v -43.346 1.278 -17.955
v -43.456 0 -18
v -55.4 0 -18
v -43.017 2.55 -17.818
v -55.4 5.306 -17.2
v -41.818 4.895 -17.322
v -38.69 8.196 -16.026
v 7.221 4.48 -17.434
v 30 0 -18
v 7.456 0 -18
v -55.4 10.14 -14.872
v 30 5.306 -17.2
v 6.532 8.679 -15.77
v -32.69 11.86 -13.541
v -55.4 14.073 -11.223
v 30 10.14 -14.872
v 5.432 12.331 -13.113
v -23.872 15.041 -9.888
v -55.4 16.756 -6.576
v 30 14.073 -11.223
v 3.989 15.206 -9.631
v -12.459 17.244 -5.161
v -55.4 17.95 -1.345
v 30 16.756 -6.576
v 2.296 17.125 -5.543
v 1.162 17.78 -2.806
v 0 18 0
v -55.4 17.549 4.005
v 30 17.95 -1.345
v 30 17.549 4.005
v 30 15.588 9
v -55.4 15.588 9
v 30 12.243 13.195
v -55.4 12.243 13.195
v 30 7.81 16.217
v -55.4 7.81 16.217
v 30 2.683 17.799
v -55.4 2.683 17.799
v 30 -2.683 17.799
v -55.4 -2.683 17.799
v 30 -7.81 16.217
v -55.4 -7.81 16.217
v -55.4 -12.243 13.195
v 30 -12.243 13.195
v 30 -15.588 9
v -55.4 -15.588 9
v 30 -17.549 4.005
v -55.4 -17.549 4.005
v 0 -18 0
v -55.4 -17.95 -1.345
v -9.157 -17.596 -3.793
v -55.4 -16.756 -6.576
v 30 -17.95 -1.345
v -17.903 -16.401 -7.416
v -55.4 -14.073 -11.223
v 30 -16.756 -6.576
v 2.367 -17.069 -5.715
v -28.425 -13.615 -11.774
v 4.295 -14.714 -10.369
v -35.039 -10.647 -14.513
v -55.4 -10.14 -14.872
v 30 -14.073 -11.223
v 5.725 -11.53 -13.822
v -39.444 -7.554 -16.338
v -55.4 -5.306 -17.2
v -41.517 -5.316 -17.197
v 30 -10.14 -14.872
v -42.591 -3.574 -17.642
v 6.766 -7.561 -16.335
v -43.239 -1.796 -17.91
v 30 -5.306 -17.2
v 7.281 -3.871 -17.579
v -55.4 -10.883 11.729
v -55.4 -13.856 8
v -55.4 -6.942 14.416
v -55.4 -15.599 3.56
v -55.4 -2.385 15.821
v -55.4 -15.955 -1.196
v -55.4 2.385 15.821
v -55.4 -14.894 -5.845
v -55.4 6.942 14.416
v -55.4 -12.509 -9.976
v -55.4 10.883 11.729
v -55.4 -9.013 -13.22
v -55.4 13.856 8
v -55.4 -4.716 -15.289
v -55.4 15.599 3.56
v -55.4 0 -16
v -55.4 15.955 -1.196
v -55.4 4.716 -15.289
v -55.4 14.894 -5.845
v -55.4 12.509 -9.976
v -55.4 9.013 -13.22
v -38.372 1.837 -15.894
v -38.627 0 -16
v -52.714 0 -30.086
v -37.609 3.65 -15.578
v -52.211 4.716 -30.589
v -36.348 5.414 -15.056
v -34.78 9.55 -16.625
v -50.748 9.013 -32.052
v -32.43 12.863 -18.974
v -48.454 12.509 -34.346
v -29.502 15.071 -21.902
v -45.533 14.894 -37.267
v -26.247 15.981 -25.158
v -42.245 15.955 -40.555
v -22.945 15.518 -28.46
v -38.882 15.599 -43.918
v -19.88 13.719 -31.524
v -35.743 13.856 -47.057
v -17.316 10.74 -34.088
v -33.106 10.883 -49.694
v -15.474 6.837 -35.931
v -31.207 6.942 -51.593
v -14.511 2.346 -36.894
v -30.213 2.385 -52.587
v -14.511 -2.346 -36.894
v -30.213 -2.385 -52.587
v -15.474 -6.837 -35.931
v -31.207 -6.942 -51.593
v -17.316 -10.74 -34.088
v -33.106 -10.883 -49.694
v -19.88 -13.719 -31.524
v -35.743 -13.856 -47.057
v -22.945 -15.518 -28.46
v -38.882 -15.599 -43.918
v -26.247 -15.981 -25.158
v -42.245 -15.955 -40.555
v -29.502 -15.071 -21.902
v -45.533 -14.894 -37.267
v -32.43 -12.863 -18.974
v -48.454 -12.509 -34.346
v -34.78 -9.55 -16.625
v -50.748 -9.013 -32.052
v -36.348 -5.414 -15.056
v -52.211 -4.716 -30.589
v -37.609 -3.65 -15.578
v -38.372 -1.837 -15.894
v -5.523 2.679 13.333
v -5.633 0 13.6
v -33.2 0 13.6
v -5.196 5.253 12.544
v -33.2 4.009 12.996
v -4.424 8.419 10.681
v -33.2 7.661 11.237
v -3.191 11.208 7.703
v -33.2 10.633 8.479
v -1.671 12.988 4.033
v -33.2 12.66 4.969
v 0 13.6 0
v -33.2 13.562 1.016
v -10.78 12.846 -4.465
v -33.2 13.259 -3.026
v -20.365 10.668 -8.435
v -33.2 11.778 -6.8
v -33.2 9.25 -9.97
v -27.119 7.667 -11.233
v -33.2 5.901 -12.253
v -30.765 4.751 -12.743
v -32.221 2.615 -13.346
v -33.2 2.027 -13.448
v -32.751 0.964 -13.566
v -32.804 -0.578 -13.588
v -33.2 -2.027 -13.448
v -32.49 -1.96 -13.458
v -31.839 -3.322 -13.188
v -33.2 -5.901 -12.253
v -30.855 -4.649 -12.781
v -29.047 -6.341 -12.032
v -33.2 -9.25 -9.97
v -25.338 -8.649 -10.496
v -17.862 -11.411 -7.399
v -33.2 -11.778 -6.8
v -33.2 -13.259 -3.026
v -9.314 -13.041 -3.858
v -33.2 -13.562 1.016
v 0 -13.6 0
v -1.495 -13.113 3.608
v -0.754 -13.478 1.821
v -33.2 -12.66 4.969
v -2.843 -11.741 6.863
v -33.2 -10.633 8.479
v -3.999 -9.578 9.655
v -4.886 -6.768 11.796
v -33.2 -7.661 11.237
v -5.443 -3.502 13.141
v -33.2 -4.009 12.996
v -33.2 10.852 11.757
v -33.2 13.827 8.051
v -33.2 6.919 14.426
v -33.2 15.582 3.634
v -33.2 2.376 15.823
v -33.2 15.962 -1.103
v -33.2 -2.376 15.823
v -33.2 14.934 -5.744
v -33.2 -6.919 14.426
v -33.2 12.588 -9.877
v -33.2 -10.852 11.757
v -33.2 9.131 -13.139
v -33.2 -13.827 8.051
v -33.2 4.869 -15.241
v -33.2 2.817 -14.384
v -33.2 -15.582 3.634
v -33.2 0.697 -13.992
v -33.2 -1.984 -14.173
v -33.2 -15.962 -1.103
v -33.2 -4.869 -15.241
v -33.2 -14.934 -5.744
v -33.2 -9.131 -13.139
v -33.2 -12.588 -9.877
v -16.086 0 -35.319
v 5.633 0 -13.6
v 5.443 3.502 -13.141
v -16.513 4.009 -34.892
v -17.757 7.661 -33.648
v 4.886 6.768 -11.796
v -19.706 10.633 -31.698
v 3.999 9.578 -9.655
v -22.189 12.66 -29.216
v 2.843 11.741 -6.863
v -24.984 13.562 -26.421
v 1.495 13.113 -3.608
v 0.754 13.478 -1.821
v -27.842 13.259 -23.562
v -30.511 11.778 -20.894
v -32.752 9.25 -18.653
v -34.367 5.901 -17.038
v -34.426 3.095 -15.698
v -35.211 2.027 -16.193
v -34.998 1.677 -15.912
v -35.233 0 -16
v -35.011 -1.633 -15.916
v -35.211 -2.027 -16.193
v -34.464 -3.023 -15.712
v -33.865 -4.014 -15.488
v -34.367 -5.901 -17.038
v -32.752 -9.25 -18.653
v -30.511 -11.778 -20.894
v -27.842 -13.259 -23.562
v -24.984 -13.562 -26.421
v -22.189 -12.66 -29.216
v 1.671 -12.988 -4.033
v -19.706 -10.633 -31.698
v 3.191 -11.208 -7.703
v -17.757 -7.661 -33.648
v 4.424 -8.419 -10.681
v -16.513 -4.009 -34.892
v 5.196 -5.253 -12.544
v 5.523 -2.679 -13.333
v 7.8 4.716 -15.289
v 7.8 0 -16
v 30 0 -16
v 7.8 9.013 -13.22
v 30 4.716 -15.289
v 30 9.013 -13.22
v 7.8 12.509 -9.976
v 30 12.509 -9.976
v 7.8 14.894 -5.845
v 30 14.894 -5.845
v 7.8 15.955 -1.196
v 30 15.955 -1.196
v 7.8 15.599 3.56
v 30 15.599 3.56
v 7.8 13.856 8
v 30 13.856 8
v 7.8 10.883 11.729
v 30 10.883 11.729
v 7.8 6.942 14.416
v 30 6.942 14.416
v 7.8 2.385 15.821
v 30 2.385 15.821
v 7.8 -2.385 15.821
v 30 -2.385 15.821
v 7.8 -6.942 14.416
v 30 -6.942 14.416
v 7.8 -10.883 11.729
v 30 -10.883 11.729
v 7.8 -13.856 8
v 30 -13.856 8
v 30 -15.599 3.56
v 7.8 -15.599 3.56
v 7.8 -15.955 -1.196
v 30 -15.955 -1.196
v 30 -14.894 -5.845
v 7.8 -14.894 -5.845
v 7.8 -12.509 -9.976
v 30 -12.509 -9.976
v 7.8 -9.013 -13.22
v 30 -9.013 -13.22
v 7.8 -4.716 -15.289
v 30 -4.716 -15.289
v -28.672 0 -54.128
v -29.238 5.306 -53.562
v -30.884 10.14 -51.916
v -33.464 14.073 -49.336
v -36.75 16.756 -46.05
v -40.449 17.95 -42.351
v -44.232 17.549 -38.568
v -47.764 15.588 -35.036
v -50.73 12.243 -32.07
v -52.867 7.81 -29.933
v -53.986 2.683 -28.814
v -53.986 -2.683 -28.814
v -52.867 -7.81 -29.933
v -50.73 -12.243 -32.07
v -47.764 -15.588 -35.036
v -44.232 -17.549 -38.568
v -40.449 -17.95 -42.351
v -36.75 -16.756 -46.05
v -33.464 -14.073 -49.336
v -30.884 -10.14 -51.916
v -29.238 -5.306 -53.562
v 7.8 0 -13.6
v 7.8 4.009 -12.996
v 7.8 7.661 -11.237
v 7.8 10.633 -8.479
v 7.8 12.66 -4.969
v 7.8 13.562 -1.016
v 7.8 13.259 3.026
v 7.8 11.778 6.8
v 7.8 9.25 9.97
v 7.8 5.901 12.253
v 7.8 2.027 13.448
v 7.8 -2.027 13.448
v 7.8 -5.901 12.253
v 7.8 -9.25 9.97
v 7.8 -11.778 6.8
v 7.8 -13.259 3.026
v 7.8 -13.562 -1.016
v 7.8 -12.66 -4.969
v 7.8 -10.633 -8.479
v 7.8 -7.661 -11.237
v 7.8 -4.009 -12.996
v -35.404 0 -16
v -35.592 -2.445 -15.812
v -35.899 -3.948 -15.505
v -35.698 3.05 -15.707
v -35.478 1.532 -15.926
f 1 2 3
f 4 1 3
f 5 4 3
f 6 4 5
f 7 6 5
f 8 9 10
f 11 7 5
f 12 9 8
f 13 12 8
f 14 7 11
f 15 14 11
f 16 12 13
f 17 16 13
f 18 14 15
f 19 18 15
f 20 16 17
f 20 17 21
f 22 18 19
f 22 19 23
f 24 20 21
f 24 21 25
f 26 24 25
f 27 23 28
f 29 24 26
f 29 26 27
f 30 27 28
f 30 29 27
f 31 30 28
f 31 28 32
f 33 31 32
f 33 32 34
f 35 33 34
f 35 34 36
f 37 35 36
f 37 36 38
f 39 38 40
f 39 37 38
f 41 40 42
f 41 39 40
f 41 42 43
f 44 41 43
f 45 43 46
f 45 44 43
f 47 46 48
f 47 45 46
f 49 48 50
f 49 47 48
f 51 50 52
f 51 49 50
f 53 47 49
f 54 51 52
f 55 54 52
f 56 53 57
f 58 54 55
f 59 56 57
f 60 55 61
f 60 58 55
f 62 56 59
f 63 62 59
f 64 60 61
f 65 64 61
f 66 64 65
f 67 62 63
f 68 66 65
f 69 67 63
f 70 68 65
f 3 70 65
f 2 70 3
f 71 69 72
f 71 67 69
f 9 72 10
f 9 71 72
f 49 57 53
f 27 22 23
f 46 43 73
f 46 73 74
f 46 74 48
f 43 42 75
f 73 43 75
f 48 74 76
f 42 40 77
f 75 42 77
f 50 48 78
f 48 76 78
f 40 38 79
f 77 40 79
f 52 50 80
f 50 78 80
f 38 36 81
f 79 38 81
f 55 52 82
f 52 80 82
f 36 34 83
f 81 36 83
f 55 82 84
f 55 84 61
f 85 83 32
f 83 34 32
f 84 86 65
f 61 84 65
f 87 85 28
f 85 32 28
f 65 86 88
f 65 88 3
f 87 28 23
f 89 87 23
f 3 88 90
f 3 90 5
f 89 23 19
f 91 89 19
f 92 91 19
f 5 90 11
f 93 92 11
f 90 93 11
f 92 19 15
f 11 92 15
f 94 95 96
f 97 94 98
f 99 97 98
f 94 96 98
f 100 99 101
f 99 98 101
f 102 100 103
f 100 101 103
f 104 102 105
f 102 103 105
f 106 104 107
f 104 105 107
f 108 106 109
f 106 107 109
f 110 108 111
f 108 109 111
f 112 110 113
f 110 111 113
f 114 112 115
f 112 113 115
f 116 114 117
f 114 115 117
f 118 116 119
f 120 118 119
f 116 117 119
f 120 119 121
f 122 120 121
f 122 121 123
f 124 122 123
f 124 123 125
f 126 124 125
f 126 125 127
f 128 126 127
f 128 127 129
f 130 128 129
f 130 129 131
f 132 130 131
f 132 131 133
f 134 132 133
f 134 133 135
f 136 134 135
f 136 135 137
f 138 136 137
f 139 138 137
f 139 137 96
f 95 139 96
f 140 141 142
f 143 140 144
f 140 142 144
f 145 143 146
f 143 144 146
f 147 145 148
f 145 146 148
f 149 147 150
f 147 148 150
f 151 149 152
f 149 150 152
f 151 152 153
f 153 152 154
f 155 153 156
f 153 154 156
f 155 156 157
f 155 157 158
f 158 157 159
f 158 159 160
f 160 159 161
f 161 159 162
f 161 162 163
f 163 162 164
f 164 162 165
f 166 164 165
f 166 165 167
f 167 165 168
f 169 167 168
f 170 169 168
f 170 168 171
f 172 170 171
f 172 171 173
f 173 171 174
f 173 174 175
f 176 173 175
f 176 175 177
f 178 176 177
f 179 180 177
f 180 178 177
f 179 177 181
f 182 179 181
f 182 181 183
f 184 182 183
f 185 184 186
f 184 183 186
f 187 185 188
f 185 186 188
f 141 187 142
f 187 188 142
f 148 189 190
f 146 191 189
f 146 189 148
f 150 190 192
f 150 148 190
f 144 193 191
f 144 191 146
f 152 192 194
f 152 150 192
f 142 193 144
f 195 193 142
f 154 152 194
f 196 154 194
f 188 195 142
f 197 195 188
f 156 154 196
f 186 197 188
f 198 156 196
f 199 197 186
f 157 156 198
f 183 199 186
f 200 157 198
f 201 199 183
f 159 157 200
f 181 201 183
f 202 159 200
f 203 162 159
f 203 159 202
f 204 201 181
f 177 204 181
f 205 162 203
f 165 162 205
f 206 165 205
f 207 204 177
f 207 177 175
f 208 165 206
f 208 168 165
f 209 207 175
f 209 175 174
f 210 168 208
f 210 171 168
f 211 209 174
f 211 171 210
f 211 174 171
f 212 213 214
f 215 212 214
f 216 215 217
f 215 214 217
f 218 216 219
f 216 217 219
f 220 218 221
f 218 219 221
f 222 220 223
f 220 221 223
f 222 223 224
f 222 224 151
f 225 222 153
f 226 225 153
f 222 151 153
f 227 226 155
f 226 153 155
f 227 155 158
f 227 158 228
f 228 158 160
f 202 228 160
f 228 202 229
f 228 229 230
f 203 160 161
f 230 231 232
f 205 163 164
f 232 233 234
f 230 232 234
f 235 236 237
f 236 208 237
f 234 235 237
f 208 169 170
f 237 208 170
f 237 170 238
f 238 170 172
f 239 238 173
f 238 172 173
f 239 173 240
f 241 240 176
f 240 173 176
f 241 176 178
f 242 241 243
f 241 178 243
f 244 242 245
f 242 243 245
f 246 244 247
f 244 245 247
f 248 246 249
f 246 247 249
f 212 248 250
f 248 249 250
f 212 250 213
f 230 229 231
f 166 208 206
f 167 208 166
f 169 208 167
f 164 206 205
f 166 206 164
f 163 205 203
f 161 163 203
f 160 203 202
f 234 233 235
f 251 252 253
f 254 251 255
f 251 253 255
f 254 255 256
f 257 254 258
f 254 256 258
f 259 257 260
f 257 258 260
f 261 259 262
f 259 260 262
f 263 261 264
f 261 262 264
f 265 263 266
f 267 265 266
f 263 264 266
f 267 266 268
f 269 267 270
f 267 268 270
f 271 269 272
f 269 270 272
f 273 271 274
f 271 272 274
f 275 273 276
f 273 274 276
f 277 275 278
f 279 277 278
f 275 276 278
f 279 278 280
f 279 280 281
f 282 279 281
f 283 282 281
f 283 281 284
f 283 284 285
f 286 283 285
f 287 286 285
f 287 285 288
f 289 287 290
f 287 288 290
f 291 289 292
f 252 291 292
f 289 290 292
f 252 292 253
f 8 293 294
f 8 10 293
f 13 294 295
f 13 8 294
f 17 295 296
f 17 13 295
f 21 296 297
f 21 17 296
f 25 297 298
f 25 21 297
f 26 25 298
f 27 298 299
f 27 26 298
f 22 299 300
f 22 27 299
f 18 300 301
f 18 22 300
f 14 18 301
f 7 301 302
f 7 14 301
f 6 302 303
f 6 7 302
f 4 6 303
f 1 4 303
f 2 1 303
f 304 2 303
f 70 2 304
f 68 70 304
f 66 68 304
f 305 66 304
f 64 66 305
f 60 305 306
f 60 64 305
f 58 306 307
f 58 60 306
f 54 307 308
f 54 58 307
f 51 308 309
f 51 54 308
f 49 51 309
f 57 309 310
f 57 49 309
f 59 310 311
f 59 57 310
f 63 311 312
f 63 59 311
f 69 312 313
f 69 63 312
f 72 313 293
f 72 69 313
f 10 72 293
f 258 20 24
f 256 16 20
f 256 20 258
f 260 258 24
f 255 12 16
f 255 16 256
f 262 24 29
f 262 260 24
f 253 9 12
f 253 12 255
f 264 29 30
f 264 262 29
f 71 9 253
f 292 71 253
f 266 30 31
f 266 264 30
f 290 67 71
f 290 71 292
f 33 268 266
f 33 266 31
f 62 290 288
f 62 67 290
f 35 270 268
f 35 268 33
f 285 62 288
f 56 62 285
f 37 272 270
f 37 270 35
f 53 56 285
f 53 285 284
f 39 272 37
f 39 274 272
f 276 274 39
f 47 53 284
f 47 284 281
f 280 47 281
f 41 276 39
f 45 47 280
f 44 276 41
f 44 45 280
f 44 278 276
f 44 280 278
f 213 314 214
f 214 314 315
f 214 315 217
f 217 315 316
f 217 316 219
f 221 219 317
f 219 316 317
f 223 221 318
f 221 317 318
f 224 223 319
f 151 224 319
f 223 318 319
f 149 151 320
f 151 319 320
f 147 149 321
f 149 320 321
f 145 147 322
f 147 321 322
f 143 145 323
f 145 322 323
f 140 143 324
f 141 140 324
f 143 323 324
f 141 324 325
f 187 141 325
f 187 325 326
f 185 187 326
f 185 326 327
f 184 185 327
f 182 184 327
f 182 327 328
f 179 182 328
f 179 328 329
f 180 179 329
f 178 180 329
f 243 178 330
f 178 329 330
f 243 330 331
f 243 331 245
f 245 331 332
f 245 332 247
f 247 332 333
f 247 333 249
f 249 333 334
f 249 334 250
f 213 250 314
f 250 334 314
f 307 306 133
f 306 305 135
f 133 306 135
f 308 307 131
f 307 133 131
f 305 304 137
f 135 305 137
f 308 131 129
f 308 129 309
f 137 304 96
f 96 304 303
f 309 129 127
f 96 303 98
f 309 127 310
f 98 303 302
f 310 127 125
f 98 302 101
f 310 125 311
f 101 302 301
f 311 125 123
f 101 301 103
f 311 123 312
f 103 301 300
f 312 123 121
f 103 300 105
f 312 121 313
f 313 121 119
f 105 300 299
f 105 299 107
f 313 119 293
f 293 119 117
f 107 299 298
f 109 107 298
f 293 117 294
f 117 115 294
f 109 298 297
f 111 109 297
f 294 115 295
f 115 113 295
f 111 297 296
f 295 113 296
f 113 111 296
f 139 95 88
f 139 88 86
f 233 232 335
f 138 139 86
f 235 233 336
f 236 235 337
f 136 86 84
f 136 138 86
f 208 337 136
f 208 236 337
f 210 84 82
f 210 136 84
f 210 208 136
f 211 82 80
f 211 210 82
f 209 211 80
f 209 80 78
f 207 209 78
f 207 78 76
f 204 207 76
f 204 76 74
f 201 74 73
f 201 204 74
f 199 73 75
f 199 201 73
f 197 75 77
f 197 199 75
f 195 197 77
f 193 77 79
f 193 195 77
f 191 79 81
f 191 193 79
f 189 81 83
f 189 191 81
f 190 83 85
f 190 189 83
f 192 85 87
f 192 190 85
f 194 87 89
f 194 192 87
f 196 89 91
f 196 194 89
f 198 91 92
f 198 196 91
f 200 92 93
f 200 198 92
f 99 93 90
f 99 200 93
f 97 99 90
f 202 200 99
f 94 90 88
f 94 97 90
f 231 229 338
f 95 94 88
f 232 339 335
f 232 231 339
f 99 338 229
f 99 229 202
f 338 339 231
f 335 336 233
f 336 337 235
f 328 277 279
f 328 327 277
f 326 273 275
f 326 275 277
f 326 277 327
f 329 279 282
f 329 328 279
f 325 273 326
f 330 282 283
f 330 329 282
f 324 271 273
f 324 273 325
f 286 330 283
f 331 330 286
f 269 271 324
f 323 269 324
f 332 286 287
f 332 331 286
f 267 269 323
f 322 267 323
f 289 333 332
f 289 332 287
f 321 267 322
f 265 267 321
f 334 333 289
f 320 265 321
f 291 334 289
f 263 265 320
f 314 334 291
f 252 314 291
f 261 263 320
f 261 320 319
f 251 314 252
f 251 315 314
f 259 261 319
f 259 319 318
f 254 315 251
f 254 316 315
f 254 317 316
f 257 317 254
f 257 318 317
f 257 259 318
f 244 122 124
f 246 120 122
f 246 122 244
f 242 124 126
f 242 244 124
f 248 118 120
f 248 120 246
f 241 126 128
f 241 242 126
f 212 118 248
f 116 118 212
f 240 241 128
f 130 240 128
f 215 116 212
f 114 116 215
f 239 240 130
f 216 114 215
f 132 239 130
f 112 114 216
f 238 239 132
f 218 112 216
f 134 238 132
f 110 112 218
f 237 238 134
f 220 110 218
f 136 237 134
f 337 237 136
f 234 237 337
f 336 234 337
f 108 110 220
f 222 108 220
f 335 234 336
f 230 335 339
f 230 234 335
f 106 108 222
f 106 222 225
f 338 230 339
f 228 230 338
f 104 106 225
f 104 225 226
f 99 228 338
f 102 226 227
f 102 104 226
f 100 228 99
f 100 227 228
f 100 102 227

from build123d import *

# Parameters (mm, degrees)
SWEEP_1_PROFILE_R   = 18
SKETCH_35_R         = 18
EXTRUDE_1_DEPTH     = 85.4
SWEEP_1_2_PROFILE_R = 13.6
SKETCH_56_R         = 13.6
CUT_EXTRUDE_3_DEPTH = 103.698548903
SKETCH_33_R         = 16
CUT_EXTRUDE_1_DEPTH = 22.2
SKETCH_34_R         = 16
CUT_EXTRUDE_2_DEPTH = 22.2
CUT_EXTRUDE_START   = -22.2
SKETCH_56_4_R       = 16
CUT_EXTRUDE_4_DEPTH = 22.2


with BuildPart() as part:
    # Sweep 1: sweep along a path in 草图1
    with BuildLine(Plane(origin=(0, 0, 0), x_dir=(1, 0, 0), z_dir=(0, 1, 0))) as sweep_1_path:
        Line((-41.4, 41.4), (0, 0))
        Line((0, 0), (30, 0))
    # Sweep 1 profile (on start of the path) → Sweep 1 (sweep)
    with BuildSketch(Plane(origin=(-41.4, 0, -41.4), x_dir=(0.7071067811865488, 0, -0.7071067811865462), z_dir=(0.7071067811865462, 0, 0.7071067811865488))):
        Circle(SWEEP_1_PROFILE_R)
    sweep(path=sweep_1_path.line, transition=Transition.RIGHT)

    # 草图35 → 凸台-拉伸1 (add)
    with BuildSketch(Plane(origin=(30, 0, 0), x_dir=(0, 0, -1), z_dir=(1, 0, 0))):
        Circle(SKETCH_35_R)
    extrude(amount=-EXTRUDE_1_DEPTH)

    # Sweep 1 2: sweep along a path in 草图1<11>
    with BuildLine(Plane(origin=(0, 0, 0), x_dir=(1, 0, 0), z_dir=(0, 1, 0))) as sweep_1_2_path:
        Line((-41.4, 41.4), (0, 0))
        Line((0, 0), (30, 0))
    # Sweep 1 2 profile (on start of the path) → Sweep 1 2 (sweep, cut)
    with BuildSketch(Plane(origin=(-41.4, 0, -41.4), x_dir=(0.7071067811865488, 0, -0.7071067811865462), z_dir=(0.7071067811865462, 0, 0.7071067811865488))):
        Circle(SWEEP_1_2_PROFILE_R)
    sweep(path=sweep_1_2_path.line, transition=Transition.RIGHT, mode=Mode.SUBTRACT)

    # 草图56 → 切除-拉伸3 (cut, through all)
    with BuildSketch(Plane.ZY.offset(55.4)):
        Circle(SKETCH_56_R)
    extrude(amount=-CUT_EXTRUDE_3_DEPTH, mode=Mode.SUBTRACT)

    # 草图33 → 切除-拉伸1 (cut)
    with BuildSketch(Plane(origin=(30, 0, 0), x_dir=(0, 0, -1), z_dir=(1, 0, 0))):
        Circle(SKETCH_33_R)
    extrude(amount=-CUT_EXTRUDE_1_DEPTH, mode=Mode.SUBTRACT)

    # 草图34 → 切除-拉伸2 (cut)
    with BuildSketch(Plane(origin=(-41.4, 0, -41.4), x_dir=(-0.7071067811865486, 0, 0.7071067811865465), z_dir=(-0.7071067811865465, 0, -0.7071067811865486))):
        Circle(SKETCH_34_R)
    extrude(amount=-CUT_EXTRUDE_2_DEPTH, mode=Mode.SUBTRACT)

    # 草图56<4> → 切除-拉伸4 (cut)
    with BuildSketch(Plane.ZY.offset(55.4).offset(CUT_EXTRUDE_START)):
        Circle(SKETCH_56_4_R)
    extrude(amount=CUT_EXTRUDE_4_DEPTH, mode=Mode.SUBTRACT)


solid = part.part
